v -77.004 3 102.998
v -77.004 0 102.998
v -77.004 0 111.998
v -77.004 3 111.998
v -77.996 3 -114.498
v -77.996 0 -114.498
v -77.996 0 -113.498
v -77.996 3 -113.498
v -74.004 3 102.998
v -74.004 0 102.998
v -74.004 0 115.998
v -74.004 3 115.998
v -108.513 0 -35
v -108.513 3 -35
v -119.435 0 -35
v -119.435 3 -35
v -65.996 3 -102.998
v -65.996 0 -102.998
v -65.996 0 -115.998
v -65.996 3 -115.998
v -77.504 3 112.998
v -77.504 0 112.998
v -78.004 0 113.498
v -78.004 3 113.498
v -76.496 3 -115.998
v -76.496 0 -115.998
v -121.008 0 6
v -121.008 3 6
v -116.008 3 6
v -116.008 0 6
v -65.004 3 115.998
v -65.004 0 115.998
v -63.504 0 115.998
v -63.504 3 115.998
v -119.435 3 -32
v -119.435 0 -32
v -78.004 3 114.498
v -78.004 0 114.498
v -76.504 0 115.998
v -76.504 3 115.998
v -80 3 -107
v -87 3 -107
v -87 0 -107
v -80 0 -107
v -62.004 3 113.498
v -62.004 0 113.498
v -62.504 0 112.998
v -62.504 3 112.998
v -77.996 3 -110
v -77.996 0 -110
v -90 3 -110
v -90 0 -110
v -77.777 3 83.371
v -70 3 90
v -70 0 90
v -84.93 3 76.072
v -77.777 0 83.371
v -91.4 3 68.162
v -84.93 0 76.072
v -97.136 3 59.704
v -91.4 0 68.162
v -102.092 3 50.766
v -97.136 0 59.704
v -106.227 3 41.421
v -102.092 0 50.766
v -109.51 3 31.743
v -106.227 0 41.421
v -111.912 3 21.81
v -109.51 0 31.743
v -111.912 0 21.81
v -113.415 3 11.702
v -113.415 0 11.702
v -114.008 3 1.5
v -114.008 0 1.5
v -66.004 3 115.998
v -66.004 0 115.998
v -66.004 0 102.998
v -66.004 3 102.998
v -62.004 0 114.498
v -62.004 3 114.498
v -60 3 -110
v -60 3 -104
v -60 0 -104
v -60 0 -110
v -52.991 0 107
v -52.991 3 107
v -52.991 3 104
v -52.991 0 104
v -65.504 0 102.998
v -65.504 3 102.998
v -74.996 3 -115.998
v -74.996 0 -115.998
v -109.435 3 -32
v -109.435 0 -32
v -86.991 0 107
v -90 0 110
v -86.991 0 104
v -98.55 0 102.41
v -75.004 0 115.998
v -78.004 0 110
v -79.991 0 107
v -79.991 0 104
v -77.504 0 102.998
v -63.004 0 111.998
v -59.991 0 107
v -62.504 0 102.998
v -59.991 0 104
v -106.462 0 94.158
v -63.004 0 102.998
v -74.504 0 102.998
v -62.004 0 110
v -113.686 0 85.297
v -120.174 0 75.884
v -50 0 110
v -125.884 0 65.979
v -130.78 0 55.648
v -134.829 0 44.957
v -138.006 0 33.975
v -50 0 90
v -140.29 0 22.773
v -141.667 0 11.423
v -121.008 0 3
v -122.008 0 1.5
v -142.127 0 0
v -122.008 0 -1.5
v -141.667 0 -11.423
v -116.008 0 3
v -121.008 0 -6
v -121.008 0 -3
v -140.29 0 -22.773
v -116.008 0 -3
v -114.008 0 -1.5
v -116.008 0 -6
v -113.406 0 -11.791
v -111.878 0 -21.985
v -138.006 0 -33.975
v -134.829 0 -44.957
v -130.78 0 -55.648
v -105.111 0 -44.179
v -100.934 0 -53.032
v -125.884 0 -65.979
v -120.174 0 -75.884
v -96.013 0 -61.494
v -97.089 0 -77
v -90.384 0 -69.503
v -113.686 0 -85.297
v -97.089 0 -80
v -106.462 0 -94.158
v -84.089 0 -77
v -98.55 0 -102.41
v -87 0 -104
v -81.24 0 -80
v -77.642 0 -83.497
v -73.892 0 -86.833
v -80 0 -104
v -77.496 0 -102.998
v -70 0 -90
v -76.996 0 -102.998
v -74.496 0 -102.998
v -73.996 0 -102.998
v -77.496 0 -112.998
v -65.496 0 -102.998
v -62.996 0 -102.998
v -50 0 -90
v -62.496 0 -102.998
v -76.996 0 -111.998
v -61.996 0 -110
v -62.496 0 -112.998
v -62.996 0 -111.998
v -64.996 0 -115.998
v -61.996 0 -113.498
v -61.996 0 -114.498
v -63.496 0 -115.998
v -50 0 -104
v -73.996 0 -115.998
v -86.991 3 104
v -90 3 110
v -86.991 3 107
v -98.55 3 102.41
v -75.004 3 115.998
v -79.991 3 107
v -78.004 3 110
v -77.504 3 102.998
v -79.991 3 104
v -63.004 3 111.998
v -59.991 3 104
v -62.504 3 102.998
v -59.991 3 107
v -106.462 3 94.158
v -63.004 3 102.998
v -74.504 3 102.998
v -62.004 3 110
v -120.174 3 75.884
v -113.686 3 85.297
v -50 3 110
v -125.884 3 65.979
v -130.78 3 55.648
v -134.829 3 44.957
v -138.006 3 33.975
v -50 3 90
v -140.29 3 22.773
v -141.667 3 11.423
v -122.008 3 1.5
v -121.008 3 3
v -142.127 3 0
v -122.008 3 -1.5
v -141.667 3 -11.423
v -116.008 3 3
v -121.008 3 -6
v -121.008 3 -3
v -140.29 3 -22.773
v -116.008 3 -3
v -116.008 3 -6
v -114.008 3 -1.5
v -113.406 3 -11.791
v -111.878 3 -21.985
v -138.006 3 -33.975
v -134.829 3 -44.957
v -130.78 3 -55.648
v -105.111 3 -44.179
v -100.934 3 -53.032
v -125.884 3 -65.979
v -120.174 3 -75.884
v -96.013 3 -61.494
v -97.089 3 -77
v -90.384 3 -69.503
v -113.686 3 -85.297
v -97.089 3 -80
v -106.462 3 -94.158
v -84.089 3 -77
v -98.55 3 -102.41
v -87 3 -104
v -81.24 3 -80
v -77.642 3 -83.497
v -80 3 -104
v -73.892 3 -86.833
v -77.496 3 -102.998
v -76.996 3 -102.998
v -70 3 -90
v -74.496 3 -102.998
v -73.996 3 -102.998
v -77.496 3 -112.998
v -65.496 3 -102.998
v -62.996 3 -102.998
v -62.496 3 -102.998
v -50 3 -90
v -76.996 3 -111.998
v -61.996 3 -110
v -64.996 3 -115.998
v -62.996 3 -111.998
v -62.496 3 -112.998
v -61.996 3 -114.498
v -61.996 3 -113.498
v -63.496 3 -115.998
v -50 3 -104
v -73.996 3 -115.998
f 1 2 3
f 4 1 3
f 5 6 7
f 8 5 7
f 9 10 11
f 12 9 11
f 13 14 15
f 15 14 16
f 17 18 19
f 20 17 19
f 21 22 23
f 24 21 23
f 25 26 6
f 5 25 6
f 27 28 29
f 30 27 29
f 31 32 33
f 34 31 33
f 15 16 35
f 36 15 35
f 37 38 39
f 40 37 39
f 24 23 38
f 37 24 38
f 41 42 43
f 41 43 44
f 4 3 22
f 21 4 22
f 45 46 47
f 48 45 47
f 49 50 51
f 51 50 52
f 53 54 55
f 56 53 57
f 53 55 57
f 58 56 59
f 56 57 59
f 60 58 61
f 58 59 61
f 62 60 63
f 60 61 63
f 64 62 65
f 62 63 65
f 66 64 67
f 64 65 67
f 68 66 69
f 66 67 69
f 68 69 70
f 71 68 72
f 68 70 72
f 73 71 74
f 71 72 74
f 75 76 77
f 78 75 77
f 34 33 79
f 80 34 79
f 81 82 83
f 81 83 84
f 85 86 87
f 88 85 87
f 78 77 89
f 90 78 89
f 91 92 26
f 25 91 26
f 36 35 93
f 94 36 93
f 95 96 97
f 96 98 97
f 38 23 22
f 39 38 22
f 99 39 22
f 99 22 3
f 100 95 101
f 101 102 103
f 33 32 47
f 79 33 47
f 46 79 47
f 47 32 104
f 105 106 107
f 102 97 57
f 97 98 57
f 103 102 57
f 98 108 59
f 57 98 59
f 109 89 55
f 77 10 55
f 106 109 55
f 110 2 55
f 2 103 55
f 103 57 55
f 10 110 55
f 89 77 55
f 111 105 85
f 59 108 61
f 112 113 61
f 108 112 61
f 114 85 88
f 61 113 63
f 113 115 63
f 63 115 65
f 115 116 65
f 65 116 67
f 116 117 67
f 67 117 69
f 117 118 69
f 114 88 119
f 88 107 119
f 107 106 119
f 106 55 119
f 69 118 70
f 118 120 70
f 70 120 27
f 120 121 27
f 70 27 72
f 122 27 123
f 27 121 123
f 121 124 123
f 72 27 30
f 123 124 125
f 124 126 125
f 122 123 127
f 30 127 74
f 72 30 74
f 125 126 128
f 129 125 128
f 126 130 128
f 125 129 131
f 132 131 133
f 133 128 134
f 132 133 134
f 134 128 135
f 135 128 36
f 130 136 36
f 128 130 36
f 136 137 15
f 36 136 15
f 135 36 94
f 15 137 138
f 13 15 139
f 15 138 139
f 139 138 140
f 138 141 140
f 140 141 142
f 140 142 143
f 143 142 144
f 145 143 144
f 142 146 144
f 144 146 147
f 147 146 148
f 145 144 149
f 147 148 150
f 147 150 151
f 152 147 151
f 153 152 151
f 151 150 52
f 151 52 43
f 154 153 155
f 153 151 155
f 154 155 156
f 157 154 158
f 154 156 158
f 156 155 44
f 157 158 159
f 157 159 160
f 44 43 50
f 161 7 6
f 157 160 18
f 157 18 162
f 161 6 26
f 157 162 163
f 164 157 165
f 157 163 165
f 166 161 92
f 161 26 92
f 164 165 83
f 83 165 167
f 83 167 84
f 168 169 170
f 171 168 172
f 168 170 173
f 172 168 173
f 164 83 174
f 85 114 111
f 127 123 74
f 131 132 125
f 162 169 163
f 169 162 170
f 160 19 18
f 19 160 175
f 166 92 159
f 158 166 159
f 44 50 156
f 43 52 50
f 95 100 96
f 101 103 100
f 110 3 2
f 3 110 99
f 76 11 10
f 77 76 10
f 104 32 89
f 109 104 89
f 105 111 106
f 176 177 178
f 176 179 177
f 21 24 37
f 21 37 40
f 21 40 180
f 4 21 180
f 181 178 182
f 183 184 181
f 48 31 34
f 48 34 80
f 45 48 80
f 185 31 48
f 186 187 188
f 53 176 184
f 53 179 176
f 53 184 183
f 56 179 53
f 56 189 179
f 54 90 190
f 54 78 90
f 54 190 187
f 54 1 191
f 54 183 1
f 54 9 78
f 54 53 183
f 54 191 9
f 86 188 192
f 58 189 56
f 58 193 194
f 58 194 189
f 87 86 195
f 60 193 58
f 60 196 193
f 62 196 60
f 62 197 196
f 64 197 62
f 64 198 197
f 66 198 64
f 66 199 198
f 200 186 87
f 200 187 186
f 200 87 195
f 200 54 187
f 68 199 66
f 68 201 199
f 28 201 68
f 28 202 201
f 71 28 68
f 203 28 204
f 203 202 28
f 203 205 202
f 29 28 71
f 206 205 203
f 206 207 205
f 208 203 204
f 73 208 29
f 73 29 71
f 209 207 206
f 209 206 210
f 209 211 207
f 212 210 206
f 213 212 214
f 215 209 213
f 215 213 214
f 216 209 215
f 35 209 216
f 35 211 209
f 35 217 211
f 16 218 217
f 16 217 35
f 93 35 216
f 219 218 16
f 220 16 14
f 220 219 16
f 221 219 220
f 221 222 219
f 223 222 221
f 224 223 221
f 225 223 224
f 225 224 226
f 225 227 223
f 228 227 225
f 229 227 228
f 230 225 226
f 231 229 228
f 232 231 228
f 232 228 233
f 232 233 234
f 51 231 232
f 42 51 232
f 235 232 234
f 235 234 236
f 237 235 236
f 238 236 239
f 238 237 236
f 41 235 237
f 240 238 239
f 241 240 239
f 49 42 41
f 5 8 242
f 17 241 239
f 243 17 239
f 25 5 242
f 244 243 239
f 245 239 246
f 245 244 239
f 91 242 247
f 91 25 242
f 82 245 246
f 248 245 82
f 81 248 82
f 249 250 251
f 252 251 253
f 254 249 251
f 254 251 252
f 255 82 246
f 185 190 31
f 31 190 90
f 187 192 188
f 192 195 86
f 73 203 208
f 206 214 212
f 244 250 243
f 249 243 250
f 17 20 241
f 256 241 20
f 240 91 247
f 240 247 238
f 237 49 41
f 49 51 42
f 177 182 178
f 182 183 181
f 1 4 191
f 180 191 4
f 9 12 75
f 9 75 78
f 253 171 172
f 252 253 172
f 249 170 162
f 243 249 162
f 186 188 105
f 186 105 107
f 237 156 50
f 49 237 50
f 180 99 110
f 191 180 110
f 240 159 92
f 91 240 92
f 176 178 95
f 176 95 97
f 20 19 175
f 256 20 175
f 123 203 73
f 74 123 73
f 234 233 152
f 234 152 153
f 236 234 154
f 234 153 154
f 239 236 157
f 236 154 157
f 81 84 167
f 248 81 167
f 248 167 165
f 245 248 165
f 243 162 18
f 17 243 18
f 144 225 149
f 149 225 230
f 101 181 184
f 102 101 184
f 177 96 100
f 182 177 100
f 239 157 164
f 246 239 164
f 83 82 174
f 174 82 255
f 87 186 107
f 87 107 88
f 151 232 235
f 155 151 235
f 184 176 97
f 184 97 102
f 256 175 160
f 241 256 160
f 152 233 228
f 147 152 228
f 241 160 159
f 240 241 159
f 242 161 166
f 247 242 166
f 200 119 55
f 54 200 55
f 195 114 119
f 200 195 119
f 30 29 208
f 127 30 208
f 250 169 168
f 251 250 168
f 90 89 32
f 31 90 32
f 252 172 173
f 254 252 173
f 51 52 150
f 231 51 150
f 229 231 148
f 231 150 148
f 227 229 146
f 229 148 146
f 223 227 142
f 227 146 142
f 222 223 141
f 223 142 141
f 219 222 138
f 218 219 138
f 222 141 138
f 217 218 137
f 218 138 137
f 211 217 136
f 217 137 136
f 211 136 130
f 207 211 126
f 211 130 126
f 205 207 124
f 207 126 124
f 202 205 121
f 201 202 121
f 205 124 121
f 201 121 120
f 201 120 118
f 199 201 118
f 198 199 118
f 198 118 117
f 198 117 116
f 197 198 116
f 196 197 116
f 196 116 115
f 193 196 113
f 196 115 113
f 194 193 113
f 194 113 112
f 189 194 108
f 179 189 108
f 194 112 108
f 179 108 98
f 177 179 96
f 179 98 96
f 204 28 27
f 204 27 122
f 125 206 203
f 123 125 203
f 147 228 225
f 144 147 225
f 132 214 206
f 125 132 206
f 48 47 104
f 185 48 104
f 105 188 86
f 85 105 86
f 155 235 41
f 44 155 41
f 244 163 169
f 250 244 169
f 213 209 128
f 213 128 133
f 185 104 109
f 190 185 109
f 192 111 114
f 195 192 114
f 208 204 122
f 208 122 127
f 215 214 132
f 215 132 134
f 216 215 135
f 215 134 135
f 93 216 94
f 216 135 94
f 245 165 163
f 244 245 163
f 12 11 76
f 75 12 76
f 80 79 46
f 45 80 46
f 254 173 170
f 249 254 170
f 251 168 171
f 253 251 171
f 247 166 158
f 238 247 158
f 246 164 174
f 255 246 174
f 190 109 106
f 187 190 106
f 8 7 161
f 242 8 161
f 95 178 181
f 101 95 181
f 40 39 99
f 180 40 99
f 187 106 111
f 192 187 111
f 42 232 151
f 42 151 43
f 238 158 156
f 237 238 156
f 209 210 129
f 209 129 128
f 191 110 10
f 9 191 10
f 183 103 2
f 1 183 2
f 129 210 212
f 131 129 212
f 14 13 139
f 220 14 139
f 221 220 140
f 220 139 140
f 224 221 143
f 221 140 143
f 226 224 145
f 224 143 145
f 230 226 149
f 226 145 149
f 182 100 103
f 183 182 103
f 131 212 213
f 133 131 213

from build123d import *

# Parameters (mm, degrees)
BOSS_EXTRUDE2_DEPTH      = 3
SKETCH3_W                = 10
SKETCH3_H                = 6
SKETCH3_W_2              = 7
SKETCH3_H_2              = 3
CUT_EXTRUDE1_DEPTH       = 3
CUT_EXTRUDE3_DEPTH       = 1
CUT_EXTRUDE3_DEPTH_BACK  = 3
SKETCH10_W               = 5
SKETCH10_H               = 3
CUT_EXTRUDE4_DEPTH       = 10
CUT_EXTRUDE12_DEPTH      = 1
CUT_EXTRUDE12_DEPTH_BACK = 3
CUT_EXTRUDE13_DEPTH      = 1
CUT_EXTRUDE13_DEPTH_BACK = 3


with BuildPart() as part:
    # Sketch2 → Boss-Extrude2 (new body)
    with BuildSketch(Plane(origin=(0, 0, 0), x_dir=(1, 0, 0), z_dir=(0, 1, 0))):
        with BuildLine():
            Line((-70, 90), (-50, 90))
            Line((-50, 90), (-50, 110))
            Line((-50, 110), (-61.99554496, 110))
            Line((-61.99554496, 110), (-62.49554496, 102.997828908))
            Line((-62.49554496, 102.997828908), (-62.99554496, 102.997828908))
            Line((-62.99554496, 102.997828908), (-62.99554496, 111.997828908))
            Line((-62.99554496, 111.997828908), (-62.49554496, 112.997828908))
            Line((-62.49554496, 112.997828908), (-61.99554496, 113.497828908))
            Line((-61.99554496, 113.497828908), (-61.99554496, 114.497828908))
            Line((-61.99554496, 114.497828908), (-63.49554496, 115.997828908))
            Line((-63.49554496, 115.997828908), (-64.99554496, 115.997828908))
            Line((-64.99554496, 115.997828908), (-65.49554496, 102.997828908))
            Line((-65.49554496, 102.997828908), (-65.99554496, 102.997828908))
            Line((-65.99554496, 102.997828908), (-65.99554496, 115.997828908))
            Line((-65.99554496, 115.997828908), (-73.99554496, 115.997828908))
            Line((-73.99554496, 115.997828908), (-73.99554496, 102.997828908))
            Line((-73.99554496, 102.997828908), (-74.49554496, 102.997828908))
            Line((-74.49554496, 102.997828908), (-74.99554496, 115.997828908))
            Line((-74.99554496, 115.997828908), (-76.49554496, 115.997828908))
            Line((-76.49554496, 115.997828908), (-77.99554496, 114.497828908))
            Line((-77.99554496, 114.497828908), (-77.99554496, 113.497828908))
            Line((-77.99554496, 113.497828908), (-77.49554496, 112.997828908))
            Line((-77.49554496, 112.997828908), (-76.99554496, 111.997828908))
            Line((-76.99554496, 111.997828908), (-76.99554496, 102.997828908))
            Line((-76.99554496, 102.997828908), (-77.49554496, 102.997828908))
            Line((-77.49554496, 102.997828908), (-77.99554496, 110))
            Line((-77.99554496, 110), (-90, 110))
            ThreePointArc((-90, 110), (-142.126704036, 0), (-90, -110))
            Line((-90, -110), (-78.00445504, -110))
            Line((-78.00445504, -110), (-77.50445504, -102.997828908))
            Line((-77.50445504, -102.997828908), (-77.00445504, -102.997828908))
            Line((-77.00445504, -102.997828908), (-77.00445504, -111.997828908))
            Line((-77.00445504, -111.997828908), (-77.50445504, -112.997828908))
            Line((-77.50445504, -112.997828908), (-78.00445504, -113.497828908))
            Line((-78.00445504, -113.497828908), (-78.00445504, -114.497828908))
            Line((-78.00445504, -114.497828908), (-76.50445504, -115.997828908))
            Line((-76.50445504, -115.997828908), (-75.00445504, -115.997828908))
            Line((-75.00445504, -115.997828908), (-74.50445504, -102.997828908))
            Line((-74.50445504, -102.997828908), (-74.00445504, -102.997828908))
            Line((-74.00445504, -102.997828908), (-74.00445504, -115.997828908))
            Line((-74.00445504, -115.997828908), (-66.00445504, -115.997828908))
            Line((-66.00445504, -115.997828908), (-66.00445504, -102.997828908))
            Line((-66.00445504, -102.997828908), (-65.50445504, -102.997828908))
            Line((-65.50445504, -102.997828908), (-65.00445504, -115.997828908))
            Line((-65.00445504, -115.997828908), (-63.50445504, -115.997828908))
            Line((-63.50445504, -115.997828908), (-62.00445504, -114.497828908))
            Line((-62.00445504, -114.497828908), (-62.00445504, -113.497828908))
            Line((-62.00445504, -113.497828908), (-62.50445504, -112.997828908))
            Line((-62.50445504, -112.997828908), (-63.00445504, -111.997828908))
            Line((-63.00445504, -111.997828908), (-63.00445504, -102.997828908))
            Line((-63.00445504, -102.997828908), (-62.50445504, -102.997828908))
            Line((-62.50445504, -102.997828908), (-62.00445504, -110))
            Line((-62.00445504, -110), (-50, -110))
            Line((-50, -110), (-50, -90))
            Line((-50, -90), (-70, -90))
            ThreePointArc((-70, -90), (-114.01754251, 0), (-70, 90))
        make_face()
    extrude(amount=BOSS_EXTRUDE2_DEPTH)

    # Sketch3 → Cut-Extrude1 (cut)
    with BuildSketch(Plane(origin=(0, 3, 0), x_dir=(1, 0, 0), z_dir=(0, 1, 0))):
        with Locations((-55, 107)):
            Rectangle(SKETCH3_W, SKETCH3_H)
        with Locations((-83.5, 105.5)):
            Rectangle(SKETCH3_W_2, SKETCH3_H_2)
        with Locations((-56.491089921, -105.5)):
            Rectangle(SKETCH3_W_2, SKETCH3_H_2)
        with Locations((-83.491089921, -105.5)):
            Rectangle(SKETCH3_W_2, SKETCH3_H_2)
    extrude(amount=-CUT_EXTRUDE1_DEPTH, mode=Mode.SUBTRACT)

    # Sketch8 → Cut-Extrude3 (cut, two sides)
    with BuildSketch(Plane(origin=(0, 3, 0), x_dir=(1, 0, 0), z_dir=(0, 1, 0))) as cut_extrude3_sk:
        Polygon((163.594434528, 1.5), (-114.00767518, 1.5), (-122.00767518, 1.5), (-122.00767518, -1.5), (-114.00767518, -1.5), (163.594434528, -1.5), (718.798653945, -1.5), (718.798653945, 1.5), align=None)
    extrude(amount=CUT_EXTRUDE3_DEPTH, mode=Mode.SUBTRACT)
    extrude(cut_extrude3_sk.sketch, amount=-CUT_EXTRUDE3_DEPTH_BACK, mode=Mode.SUBTRACT)

    # Sketch10 → Cut-Extrude4 (cut)
    with BuildSketch(Plane(origin=(0, 3, 0), x_dir=(1, 0, 0), z_dir=(0, 1, 0))):
        with Locations((-118.50767518, 4.5)):
            Rectangle(SKETCH10_W, SKETCH10_H)
        with Locations((-118.50767518, -4.5)):
            Rectangle(SKETCH10_W, SKETCH10_H)
    extrude(amount=-CUT_EXTRUDE4_DEPTH, mode=Mode.SUBTRACT)

    # Sketch9 → Cut-Extrude12 (cut, two sides)
    with BuildSketch(Plane(origin=(0, 3, 0), x_dir=(1, 0, 0), z_dir=(0, 1, 0))) as cut_extrude12_sk:
        Polygon((339.233941087, 80), (-81.240384046, 80), (-97.089238313, 80), (-97.089238313, 77), (-84.089238313, 77), (336.385086821, 77), (946.188662062, -502.080505639), (949.037516328, -499.080505639), align=None)
    extrude(amount=CUT_EXTRUDE12_DEPTH, mode=Mode.SUBTRACT)
    extrude(cut_extrude12_sk.sketch, amount=-CUT_EXTRUDE12_DEPTH_BACK, mode=Mode.SUBTRACT)

    # Sketch13 → Cut-Extrude13 (cut, two sides)
    with BuildSketch(Plane(origin=(0, 3, 0), x_dir=(1, 0, 0), z_dir=(0, 1, 0))) as cut_extrude13_sk:
        Polygon((225.364323888, 35), (-108.512672071, 35), (-119.434912162, 35), (-119.434912162, 32), (-109.434912162, 32), (224.442083797, 32), (862.717356055, -164.214348471), (863.639596146, -161.214348471), align=None)
    extrude(amount=CUT_EXTRUDE13_DEPTH, mode=Mode.SUBTRACT)
    extrude(cut_extrude13_sk.sketch, amount=-CUT_EXTRUDE13_DEPTH_BACK, mode=Mode.SUBTRACT)


solid = part.part
